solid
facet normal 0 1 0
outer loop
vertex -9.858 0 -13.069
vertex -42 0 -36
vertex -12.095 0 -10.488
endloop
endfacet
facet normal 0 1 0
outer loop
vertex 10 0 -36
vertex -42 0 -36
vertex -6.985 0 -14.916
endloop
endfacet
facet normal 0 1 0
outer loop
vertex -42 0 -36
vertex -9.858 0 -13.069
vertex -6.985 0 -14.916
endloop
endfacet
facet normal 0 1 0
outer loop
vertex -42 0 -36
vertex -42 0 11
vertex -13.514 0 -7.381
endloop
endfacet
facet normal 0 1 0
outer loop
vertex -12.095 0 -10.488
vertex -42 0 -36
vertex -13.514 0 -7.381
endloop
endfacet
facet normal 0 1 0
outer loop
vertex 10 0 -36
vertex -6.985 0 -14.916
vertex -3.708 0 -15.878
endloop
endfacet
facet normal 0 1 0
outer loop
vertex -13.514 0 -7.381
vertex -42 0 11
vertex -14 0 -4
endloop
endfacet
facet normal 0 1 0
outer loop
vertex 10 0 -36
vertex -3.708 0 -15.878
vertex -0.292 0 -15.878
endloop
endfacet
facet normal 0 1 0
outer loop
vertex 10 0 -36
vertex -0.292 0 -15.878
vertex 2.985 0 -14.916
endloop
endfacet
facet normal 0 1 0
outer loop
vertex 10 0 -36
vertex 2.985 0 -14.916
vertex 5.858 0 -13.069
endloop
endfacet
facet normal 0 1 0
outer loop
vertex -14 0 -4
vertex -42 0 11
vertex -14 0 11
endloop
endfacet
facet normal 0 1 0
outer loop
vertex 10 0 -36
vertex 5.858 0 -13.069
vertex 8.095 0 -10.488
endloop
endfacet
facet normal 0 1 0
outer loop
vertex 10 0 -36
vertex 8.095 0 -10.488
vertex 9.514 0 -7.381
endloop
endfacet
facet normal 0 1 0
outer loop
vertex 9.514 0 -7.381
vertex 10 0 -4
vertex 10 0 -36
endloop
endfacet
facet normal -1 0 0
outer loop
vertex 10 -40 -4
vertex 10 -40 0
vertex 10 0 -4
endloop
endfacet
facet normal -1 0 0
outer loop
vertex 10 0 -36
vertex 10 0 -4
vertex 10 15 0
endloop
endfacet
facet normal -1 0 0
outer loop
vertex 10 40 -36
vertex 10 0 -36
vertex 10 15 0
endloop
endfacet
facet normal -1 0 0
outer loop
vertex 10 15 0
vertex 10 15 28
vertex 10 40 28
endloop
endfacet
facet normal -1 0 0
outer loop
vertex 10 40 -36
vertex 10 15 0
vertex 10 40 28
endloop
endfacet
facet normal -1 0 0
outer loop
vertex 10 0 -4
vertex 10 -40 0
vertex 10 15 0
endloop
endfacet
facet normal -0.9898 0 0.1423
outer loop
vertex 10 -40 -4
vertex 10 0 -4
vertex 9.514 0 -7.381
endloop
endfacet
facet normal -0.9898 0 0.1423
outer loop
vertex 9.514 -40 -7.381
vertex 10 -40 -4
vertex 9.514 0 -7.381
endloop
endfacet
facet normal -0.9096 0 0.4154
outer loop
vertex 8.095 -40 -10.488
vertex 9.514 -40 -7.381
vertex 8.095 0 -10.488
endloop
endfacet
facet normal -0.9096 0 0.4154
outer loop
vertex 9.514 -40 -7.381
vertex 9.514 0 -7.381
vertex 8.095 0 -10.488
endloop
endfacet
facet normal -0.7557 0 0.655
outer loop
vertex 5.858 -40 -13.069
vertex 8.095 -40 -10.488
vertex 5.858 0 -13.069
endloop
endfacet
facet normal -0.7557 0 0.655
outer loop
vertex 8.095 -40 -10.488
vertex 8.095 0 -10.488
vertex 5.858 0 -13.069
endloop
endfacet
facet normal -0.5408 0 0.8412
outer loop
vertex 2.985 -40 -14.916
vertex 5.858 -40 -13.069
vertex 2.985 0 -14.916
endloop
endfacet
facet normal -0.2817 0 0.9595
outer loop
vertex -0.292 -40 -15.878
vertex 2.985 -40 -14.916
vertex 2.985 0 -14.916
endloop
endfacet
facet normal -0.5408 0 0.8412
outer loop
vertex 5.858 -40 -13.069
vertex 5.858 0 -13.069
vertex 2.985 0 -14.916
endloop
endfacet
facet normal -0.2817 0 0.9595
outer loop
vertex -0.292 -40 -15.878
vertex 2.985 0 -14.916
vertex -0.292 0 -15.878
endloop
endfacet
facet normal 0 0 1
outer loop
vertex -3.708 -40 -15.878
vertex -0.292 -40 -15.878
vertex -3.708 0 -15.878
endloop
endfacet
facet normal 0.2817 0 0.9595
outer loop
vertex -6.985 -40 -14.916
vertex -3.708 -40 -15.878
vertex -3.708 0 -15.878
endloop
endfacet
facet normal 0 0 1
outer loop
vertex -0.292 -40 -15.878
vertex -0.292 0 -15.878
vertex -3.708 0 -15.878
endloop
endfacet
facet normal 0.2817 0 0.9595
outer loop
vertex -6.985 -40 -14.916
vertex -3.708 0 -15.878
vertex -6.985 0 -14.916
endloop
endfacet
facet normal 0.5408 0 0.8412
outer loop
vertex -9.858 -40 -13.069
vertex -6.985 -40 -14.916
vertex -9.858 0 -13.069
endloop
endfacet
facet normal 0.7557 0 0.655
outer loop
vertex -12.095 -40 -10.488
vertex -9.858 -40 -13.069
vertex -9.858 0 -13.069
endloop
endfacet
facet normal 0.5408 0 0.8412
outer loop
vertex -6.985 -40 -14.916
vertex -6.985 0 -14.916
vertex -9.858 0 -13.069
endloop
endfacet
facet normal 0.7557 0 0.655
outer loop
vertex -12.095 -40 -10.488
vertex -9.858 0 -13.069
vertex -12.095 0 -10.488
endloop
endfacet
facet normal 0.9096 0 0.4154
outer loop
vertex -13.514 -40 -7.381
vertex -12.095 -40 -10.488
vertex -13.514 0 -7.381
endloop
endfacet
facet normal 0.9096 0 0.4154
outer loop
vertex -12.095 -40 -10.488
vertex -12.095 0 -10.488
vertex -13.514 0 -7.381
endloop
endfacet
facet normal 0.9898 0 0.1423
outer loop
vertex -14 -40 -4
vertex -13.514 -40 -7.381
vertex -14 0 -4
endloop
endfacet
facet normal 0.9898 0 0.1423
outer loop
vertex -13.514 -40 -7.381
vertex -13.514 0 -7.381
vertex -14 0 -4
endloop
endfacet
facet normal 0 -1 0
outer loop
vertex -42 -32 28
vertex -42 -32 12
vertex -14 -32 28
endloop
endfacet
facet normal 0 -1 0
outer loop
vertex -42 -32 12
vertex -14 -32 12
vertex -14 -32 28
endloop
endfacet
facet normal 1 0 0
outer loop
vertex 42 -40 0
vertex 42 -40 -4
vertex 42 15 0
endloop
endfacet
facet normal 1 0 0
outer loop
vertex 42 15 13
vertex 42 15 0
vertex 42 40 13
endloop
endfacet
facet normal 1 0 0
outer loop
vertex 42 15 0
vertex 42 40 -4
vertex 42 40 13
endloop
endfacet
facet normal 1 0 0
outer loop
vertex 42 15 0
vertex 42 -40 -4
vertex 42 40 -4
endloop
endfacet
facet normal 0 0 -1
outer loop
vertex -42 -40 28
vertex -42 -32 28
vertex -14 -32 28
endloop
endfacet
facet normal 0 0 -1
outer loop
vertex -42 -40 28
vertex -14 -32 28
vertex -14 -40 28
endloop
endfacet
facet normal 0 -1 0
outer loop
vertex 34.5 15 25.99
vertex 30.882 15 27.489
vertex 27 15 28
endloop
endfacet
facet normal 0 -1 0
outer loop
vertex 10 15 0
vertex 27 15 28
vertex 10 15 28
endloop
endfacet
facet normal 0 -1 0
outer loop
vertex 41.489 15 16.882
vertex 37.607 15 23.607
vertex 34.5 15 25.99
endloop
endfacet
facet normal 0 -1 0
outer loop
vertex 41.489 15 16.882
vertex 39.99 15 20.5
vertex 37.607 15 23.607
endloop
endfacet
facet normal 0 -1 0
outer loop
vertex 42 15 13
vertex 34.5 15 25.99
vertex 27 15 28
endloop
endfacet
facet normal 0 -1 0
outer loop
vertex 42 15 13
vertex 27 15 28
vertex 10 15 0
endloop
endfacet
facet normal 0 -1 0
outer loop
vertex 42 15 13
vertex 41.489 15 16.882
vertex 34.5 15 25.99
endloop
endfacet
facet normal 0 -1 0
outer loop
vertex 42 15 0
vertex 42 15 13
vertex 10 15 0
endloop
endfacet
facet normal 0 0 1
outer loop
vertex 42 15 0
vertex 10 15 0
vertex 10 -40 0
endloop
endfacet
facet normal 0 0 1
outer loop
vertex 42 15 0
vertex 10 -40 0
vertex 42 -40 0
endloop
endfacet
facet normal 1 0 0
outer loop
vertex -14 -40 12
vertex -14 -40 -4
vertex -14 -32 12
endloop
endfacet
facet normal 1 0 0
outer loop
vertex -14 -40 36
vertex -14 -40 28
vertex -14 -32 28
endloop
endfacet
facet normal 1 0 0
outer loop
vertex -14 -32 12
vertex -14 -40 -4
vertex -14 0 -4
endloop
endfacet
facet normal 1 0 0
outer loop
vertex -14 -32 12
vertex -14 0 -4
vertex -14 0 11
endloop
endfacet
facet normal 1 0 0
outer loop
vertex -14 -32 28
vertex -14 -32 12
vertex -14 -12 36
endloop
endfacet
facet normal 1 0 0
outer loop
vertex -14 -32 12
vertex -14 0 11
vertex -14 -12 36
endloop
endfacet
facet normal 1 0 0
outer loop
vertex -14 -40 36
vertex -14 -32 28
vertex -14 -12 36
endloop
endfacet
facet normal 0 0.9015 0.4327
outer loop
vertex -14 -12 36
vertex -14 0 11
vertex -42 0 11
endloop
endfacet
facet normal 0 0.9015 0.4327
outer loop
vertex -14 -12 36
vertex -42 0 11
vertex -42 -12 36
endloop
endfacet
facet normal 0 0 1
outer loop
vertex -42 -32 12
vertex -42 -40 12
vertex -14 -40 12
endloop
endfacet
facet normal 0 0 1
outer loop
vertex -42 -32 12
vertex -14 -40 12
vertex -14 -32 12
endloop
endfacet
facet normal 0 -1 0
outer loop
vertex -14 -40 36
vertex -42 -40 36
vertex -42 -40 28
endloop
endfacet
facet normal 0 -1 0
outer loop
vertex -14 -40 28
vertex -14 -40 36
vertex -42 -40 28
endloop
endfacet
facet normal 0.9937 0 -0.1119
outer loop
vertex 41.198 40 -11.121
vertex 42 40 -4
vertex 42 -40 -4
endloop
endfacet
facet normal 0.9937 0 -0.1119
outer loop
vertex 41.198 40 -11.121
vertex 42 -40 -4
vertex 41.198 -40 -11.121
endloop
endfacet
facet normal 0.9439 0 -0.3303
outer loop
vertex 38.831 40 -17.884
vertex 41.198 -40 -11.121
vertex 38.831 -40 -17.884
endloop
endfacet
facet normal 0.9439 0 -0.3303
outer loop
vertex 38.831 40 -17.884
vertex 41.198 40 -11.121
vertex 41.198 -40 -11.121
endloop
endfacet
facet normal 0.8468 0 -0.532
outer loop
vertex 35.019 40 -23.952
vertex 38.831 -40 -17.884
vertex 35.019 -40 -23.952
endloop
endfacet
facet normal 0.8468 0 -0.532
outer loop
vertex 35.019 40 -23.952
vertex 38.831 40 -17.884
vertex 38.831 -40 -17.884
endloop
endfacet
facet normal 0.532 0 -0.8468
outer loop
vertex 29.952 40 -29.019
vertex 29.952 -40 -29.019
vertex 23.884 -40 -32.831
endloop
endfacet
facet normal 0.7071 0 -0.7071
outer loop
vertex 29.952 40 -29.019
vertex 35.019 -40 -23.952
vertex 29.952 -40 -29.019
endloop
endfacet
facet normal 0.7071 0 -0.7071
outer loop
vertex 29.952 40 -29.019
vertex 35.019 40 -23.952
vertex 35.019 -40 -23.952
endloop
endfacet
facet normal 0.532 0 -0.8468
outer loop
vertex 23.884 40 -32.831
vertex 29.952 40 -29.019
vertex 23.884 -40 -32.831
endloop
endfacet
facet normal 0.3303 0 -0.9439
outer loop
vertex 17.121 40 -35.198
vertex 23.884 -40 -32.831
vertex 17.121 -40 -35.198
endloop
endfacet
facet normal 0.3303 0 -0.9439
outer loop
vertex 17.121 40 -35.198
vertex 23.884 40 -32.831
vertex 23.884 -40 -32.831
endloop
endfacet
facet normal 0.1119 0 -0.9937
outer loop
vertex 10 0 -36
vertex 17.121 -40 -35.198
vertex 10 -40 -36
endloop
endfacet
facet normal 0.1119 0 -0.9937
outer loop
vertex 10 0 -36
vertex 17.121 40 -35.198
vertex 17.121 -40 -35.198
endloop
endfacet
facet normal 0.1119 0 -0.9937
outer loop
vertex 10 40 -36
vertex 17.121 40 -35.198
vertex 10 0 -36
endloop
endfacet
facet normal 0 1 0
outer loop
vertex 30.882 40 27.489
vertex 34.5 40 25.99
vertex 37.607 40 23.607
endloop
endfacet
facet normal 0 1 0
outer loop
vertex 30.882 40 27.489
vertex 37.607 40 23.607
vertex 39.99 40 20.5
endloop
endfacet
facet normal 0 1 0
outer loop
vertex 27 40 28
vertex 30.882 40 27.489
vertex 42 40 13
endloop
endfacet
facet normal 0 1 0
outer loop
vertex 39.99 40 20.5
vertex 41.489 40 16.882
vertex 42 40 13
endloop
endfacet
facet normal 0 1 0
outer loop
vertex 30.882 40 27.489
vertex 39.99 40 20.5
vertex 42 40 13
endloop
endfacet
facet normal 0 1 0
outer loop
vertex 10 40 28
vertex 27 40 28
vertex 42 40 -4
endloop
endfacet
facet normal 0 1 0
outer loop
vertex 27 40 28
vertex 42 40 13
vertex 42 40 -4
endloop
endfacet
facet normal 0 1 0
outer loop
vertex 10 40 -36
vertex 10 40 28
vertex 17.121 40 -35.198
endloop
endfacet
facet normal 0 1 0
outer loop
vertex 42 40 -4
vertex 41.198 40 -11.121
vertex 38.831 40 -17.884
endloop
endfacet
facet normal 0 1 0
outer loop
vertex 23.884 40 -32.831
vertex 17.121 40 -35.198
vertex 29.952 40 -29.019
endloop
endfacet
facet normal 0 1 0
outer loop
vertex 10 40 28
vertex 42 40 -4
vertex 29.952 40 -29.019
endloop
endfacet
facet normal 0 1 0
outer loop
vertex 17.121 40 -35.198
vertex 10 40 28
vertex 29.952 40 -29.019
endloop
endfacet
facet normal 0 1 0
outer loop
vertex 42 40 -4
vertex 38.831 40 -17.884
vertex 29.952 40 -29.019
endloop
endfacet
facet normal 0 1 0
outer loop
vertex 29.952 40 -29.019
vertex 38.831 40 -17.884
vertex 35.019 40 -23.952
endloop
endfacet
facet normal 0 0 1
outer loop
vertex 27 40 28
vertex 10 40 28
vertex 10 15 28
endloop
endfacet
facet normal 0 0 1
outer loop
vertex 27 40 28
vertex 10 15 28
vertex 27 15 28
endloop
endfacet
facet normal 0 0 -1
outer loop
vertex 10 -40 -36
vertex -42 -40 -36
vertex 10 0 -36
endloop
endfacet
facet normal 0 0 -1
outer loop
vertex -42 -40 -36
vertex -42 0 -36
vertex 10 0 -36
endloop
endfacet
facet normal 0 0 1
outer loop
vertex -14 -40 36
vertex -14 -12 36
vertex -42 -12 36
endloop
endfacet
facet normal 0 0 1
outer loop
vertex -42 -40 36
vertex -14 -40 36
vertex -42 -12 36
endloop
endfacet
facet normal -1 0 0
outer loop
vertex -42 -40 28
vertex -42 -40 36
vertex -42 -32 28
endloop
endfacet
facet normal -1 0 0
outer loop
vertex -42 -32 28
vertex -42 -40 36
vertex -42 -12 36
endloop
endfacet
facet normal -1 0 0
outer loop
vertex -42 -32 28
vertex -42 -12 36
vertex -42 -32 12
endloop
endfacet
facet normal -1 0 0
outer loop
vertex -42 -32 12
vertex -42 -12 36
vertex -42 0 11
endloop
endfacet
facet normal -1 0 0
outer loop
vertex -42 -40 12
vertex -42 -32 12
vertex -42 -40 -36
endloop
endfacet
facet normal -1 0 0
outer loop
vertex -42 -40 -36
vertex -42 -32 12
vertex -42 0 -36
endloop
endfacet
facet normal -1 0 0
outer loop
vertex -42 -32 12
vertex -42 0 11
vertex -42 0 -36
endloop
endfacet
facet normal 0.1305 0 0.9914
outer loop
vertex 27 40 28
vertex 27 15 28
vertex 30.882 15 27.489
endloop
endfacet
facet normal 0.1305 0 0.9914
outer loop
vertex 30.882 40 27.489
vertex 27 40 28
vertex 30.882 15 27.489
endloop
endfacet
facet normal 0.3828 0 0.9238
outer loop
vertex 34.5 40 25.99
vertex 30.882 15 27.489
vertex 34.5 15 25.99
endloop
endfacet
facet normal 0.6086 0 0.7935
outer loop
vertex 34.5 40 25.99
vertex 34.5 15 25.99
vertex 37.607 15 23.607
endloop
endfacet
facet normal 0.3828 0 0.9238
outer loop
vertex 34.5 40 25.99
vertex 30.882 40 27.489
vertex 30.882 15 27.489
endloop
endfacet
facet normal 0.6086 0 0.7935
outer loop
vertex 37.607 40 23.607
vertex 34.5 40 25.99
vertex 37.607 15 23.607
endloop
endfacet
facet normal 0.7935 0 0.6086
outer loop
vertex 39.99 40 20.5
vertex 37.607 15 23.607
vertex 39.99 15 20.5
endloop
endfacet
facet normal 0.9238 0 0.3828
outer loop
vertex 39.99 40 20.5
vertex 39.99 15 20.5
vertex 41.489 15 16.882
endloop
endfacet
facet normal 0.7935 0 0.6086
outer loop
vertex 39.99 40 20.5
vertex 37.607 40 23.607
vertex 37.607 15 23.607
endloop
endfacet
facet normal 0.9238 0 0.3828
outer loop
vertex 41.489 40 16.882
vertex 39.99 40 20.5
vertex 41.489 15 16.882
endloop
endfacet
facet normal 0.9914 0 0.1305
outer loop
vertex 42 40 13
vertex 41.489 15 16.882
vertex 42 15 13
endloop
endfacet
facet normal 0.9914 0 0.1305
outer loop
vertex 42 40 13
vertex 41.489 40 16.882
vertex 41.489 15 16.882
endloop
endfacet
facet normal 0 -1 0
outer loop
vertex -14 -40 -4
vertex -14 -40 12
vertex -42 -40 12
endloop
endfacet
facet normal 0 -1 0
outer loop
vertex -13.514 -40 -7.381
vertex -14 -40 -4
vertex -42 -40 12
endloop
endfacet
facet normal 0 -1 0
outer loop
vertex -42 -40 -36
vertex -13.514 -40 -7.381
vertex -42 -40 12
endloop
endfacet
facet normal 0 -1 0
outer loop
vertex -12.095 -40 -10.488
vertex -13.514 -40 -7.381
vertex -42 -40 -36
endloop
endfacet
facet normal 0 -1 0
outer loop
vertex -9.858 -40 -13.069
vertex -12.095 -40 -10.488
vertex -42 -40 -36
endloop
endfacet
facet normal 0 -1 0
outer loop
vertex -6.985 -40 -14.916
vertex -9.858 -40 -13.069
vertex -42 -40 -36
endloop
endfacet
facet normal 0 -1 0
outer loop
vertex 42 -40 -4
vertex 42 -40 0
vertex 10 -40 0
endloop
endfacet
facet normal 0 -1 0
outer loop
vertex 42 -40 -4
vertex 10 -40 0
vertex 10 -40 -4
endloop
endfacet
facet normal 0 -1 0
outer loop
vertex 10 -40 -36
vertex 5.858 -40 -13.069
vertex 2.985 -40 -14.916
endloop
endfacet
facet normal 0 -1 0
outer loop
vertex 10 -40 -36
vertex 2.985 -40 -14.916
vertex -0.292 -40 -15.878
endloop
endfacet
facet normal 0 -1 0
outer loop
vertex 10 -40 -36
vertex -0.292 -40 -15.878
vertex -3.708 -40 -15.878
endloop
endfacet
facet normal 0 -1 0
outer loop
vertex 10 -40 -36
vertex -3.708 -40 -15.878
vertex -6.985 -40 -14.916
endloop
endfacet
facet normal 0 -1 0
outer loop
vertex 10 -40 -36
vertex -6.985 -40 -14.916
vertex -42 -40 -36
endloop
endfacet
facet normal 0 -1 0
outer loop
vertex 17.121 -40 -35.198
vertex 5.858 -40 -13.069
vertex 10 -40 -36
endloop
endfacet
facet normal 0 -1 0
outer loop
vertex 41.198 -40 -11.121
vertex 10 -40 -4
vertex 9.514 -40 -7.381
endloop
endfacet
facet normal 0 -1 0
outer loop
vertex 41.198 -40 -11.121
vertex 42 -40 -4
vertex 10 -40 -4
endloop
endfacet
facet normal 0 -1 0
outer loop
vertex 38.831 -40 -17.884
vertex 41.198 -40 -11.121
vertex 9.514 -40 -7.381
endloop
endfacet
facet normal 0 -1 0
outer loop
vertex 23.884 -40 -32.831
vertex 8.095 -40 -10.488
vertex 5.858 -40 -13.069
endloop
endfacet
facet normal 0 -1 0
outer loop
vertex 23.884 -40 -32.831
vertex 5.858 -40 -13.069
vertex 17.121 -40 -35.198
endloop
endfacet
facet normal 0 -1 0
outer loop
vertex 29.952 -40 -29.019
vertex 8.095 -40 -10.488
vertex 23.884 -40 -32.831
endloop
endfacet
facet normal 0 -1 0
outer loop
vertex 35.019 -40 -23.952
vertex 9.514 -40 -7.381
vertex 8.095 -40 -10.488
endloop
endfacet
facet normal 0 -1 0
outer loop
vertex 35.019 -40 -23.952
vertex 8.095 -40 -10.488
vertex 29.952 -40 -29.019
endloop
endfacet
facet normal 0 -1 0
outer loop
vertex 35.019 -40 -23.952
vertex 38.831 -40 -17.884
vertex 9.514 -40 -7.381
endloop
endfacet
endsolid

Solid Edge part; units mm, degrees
sketch "Sketch1" plane through (0, 0, 0) normal (0, -1, 0) x (1, 0, 0)
  line L0 (-14, 36) -> (-42, 36)
  line L1 (-42, 36) -> (-42, -36)
  line L2 (-42, -36) -> (10, -36)
  arc A0 (10, -36) -> (42, -4) centre (10, -4) ccw
  line L3 (42, -4) -> (42, 13)
  arc A1 (27, 28) -> (42, 13) centre (27, 13) cw
  line L4 (10, 28) -> (27, 28)
  line L5 (10, -4) -> (10, 28)
  line L6 (-14, -4) -> (-14, 36)
  arc A2 (10, -4) -> (-14, -4) centre (-2, -4) cw
extrude "Protrusion1" add sketch "Sketch1" along normal mid plane 80
sketch "Sketch2" plane through (0, -40, 0) normal (0, -1, 0) x (1, 0, 0)
  line L0 (42, 0) -> (42, 28)
  line L1 (42, 28) -> (10, 28)
  line L2 (10, 28) -> (10, 0)
  line L3 (10, 0) -> (42, 0)
extrude "ExtrudedCutout_1" cut sketch "Sketch2" against normal blind 55
sketch "Sketch3" plane through (-28, 0, 36) normal (0, 0, 1) x (0, 1, 0)
  line L0 (0, -38) -> (40, -38)
  line L1 (40, -38) -> (40, 14)
  line L2 (40, 14) -> (0, 14)
  line L3 (0, 14) -> (0, -38)
extrude "ExtrudedCutout_2" cut sketch "Sketch3" against normal blind 72
sketch "Sketch4" plane through (-14, -20, 16) normal (1, 0, 0) x (0, 1, 0)
  line L0 (-12, 12) -> (-20, 12)
  line L1 (-20, 12) -> (-20, -4)
  line L2 (-20, -4) -> (-12, -4)
  line L3 (-12, -4) -> (-12, 12)
  line L4 (20, -5) -> (8, 20)
  line L5 (20, 20) -> (8, 20)
  line L6 (20, 20) -> (20, -5)
extrude "ExtrudedCutout_3" cut sketch "Sketch4" against normal blind 68.049
